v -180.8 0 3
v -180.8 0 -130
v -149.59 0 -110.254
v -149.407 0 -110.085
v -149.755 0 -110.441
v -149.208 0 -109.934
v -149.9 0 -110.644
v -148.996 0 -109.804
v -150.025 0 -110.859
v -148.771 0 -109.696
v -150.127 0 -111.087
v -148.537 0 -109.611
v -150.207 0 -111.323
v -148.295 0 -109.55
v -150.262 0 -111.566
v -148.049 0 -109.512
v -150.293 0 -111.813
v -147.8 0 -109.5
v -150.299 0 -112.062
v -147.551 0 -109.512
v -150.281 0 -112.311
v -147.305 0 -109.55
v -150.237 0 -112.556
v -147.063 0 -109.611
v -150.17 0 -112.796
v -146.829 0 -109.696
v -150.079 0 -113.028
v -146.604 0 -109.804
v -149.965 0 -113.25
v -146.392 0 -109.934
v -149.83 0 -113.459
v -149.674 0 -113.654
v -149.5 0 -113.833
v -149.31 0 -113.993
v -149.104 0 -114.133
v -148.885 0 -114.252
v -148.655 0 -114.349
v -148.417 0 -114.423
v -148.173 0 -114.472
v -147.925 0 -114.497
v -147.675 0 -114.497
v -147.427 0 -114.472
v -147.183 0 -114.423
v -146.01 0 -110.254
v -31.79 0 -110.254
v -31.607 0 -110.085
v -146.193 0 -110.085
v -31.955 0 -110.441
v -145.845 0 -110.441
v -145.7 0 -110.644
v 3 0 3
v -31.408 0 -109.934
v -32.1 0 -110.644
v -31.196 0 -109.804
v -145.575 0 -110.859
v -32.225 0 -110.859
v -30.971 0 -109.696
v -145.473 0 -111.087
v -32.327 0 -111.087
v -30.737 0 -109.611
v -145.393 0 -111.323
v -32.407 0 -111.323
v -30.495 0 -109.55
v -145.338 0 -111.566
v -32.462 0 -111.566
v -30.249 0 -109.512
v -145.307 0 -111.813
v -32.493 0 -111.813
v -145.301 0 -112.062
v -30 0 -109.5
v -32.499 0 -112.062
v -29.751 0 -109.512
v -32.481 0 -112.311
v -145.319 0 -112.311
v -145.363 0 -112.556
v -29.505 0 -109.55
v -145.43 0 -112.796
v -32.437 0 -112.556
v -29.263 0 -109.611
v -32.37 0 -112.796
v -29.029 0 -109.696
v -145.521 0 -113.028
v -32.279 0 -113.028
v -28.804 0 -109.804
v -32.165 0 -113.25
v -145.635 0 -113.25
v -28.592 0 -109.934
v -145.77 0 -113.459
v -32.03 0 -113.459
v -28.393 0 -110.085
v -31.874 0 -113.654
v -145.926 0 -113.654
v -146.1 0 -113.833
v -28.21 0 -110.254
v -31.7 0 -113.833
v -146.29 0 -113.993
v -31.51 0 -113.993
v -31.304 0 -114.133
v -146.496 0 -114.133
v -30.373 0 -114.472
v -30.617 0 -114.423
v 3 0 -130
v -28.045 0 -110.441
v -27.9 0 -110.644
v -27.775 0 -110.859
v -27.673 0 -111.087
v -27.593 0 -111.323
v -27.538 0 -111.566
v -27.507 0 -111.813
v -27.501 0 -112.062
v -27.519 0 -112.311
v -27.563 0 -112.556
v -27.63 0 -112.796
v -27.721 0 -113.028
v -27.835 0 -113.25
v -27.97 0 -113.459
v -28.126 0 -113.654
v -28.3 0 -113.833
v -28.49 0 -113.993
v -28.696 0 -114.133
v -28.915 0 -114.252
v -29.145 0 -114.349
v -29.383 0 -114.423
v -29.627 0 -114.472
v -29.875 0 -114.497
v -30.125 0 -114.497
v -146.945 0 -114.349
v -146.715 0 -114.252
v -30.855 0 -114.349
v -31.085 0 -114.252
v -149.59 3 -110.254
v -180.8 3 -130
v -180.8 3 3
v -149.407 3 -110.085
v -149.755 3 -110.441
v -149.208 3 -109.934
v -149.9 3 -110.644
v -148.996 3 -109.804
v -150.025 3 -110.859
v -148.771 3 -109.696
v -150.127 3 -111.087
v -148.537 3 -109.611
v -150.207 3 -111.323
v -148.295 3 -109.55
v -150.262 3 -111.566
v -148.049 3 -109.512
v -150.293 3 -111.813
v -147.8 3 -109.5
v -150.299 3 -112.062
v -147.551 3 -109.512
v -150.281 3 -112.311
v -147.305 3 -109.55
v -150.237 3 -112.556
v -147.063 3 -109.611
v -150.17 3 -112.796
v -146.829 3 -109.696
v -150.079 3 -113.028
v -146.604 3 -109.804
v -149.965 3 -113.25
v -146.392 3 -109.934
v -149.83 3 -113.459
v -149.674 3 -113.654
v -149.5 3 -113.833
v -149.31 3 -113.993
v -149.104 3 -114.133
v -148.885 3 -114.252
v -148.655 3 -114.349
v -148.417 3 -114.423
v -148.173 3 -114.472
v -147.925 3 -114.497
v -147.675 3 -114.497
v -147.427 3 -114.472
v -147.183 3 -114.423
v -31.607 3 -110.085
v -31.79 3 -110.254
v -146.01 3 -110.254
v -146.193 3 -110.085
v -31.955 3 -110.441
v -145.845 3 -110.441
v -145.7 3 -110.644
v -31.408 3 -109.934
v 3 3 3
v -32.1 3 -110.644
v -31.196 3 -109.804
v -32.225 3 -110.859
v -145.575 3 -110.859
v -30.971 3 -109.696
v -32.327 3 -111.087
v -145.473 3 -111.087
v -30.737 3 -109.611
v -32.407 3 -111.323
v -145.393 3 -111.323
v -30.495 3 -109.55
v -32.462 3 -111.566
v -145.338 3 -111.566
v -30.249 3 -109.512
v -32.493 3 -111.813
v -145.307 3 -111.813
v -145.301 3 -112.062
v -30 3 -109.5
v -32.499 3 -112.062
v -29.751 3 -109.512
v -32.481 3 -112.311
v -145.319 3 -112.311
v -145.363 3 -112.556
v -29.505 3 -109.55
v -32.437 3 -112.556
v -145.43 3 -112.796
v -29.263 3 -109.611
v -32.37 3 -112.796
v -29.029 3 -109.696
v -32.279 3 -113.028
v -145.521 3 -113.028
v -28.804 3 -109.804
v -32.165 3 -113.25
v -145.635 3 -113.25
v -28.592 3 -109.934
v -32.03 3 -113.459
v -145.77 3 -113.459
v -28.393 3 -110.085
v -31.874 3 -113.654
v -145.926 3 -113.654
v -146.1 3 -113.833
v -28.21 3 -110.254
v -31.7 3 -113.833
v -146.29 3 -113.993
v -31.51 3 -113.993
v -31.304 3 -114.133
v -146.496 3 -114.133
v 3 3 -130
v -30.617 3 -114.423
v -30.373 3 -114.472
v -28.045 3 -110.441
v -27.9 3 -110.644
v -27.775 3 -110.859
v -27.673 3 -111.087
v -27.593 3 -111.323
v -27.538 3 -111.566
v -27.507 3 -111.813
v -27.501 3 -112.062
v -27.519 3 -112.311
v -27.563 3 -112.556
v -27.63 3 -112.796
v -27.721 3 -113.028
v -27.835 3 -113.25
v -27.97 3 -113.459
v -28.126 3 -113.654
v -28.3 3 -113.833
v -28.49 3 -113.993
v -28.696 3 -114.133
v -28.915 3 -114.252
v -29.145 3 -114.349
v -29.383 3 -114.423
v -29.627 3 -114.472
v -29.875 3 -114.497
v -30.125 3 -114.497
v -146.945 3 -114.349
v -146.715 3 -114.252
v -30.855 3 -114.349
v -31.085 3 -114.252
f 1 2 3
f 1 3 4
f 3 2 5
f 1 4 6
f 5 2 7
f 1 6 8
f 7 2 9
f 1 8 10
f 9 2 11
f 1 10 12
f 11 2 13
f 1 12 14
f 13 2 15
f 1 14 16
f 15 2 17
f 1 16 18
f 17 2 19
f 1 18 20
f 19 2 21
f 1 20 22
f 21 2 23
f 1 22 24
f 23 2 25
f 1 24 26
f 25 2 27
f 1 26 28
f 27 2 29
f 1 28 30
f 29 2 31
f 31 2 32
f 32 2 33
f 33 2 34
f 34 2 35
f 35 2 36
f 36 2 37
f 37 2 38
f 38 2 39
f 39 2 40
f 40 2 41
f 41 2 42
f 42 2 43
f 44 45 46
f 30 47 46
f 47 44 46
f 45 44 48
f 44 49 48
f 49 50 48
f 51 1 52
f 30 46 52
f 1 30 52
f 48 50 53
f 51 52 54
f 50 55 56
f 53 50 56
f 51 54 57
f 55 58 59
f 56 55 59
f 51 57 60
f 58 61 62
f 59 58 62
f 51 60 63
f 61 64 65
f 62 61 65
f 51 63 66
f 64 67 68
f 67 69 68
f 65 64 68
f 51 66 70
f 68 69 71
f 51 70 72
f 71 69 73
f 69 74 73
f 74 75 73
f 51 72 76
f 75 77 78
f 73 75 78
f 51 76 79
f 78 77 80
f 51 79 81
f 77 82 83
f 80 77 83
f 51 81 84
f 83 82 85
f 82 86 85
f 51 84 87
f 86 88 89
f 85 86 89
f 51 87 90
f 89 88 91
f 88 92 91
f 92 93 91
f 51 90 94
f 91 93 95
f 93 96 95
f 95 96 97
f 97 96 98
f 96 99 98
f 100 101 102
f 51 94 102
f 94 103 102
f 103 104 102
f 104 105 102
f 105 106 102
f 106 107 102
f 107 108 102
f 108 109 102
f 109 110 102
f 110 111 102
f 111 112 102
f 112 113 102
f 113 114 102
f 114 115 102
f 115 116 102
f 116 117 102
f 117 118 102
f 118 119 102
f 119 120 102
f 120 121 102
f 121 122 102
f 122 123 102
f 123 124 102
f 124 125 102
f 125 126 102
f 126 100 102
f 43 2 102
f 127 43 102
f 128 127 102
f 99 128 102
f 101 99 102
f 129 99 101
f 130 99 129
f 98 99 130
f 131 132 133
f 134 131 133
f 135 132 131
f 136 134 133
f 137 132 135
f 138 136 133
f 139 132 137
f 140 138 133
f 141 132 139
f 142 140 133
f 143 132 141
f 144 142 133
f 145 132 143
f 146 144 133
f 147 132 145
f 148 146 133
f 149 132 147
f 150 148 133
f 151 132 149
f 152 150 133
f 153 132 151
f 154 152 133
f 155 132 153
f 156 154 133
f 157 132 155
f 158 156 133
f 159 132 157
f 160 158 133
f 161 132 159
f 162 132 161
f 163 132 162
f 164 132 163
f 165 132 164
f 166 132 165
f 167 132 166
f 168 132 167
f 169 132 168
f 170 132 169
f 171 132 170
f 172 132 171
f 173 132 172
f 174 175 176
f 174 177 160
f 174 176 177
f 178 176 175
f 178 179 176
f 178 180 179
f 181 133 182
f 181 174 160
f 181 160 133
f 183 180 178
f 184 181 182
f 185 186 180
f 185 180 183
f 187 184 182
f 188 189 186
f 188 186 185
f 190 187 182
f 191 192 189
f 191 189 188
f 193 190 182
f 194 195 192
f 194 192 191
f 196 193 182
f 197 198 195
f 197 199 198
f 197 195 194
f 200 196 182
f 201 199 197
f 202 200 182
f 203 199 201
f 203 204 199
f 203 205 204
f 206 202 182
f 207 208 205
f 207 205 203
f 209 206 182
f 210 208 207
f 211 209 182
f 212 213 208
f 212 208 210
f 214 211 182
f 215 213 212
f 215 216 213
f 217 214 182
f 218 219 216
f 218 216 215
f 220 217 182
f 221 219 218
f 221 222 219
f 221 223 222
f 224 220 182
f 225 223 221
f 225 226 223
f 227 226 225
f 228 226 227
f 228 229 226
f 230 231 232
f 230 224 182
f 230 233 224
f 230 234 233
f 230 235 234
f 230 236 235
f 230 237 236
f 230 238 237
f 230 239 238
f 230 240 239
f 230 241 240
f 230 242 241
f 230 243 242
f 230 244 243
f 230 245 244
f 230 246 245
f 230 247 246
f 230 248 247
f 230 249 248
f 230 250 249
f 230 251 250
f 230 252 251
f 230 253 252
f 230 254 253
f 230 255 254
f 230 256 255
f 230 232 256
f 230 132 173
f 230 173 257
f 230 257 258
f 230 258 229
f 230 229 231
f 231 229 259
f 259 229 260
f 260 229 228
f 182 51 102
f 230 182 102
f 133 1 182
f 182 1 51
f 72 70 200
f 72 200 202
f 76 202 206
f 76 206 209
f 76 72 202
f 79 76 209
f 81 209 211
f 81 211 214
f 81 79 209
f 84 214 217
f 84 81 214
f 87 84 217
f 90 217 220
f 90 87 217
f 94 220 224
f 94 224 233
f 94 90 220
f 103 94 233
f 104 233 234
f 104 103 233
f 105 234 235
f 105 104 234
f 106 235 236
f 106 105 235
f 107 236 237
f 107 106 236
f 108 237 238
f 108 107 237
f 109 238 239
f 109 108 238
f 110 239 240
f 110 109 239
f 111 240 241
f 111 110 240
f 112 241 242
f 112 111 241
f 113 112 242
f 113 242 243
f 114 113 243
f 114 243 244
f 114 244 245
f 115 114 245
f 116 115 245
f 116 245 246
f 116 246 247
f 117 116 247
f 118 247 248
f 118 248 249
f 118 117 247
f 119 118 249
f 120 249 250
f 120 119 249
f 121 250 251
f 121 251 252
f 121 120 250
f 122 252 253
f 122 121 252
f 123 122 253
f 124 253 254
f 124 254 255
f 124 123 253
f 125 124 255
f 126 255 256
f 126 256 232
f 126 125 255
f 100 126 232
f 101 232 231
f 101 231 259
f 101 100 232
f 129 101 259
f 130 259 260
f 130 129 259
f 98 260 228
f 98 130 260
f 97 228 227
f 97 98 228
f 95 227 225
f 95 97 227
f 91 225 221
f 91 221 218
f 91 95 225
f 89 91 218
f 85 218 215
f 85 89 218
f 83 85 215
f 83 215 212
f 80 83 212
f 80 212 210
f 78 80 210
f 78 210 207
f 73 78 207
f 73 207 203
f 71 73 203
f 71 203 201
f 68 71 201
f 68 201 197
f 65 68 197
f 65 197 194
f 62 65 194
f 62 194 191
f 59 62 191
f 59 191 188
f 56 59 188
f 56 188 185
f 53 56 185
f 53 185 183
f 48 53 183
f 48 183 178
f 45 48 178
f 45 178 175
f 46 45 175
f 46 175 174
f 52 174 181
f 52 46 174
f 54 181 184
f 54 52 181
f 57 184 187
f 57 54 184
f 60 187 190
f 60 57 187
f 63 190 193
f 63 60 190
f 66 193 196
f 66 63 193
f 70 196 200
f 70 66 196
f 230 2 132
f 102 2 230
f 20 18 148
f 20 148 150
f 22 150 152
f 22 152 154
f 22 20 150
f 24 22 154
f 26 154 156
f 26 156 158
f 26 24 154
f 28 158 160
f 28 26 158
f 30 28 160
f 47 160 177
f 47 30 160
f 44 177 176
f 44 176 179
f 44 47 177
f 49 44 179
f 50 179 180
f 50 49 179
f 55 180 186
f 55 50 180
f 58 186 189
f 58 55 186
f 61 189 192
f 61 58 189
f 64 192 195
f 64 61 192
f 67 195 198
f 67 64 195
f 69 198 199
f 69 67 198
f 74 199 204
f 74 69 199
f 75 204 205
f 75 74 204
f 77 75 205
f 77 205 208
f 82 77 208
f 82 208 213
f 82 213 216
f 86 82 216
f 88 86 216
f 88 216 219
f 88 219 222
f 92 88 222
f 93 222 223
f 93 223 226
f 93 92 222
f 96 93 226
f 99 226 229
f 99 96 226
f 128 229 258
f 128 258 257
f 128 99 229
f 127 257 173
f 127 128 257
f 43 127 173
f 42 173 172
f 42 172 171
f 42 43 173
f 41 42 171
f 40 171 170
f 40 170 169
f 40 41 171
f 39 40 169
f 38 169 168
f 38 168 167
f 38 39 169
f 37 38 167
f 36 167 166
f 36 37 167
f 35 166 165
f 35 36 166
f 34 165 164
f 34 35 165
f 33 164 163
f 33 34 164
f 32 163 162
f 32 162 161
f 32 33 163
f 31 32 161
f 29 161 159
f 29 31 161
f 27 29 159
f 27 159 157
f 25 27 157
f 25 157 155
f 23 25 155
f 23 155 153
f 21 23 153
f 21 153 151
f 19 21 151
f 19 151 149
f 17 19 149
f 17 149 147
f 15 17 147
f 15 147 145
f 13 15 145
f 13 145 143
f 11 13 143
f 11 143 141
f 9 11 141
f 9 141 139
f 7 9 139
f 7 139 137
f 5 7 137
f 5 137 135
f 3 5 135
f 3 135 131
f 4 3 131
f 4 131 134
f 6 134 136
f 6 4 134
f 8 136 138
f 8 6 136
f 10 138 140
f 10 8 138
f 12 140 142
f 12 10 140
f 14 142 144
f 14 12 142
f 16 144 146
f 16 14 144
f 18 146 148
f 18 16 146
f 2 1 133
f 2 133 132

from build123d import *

# Parameters (mm, degrees)
SKETCH2_W           = 183.8
SKETCH2_H           = 133
SKETCH2_W_2         = 177.8
SKETCH2_H_2         = 127
SKETCH2_R           = 2.5
BOSS_EXTRUDE1_DEPTH = 3


with BuildPart() as part:
    # Sketch2 → Boss-Extrude1 (new body)
    with BuildSketch(Plane(origin=(0, 0, 0), x_dir=(1, 0, 0), z_dir=(0, 1, 0))):
        with Locations((-88.9, 63.5)):
            Rectangle(SKETCH2_W, SKETCH2_H)
        with Locations((-88.9, 63.5)):
            Rectangle(SKETCH2_W_2, SKETCH2_H_2, mode=Mode.SUBTRACT)
        with Locations((-88.9, 63.5)):
            Rectangle(SKETCH2_W_2, SKETCH2_H_2)
        with Locations(Location((-30, 112, 0), (0, 0, 270))):
            Circle(SKETCH2_R, mode=Mode.SUBTRACT)
        with Locations(Location((-147.8, 112, 0), (0, 0, 270))):
            Circle(SKETCH2_R, mode=Mode.SUBTRACT)
    extrude(amount=BOSS_EXTRUDE1_DEPTH)


solid = part.part
